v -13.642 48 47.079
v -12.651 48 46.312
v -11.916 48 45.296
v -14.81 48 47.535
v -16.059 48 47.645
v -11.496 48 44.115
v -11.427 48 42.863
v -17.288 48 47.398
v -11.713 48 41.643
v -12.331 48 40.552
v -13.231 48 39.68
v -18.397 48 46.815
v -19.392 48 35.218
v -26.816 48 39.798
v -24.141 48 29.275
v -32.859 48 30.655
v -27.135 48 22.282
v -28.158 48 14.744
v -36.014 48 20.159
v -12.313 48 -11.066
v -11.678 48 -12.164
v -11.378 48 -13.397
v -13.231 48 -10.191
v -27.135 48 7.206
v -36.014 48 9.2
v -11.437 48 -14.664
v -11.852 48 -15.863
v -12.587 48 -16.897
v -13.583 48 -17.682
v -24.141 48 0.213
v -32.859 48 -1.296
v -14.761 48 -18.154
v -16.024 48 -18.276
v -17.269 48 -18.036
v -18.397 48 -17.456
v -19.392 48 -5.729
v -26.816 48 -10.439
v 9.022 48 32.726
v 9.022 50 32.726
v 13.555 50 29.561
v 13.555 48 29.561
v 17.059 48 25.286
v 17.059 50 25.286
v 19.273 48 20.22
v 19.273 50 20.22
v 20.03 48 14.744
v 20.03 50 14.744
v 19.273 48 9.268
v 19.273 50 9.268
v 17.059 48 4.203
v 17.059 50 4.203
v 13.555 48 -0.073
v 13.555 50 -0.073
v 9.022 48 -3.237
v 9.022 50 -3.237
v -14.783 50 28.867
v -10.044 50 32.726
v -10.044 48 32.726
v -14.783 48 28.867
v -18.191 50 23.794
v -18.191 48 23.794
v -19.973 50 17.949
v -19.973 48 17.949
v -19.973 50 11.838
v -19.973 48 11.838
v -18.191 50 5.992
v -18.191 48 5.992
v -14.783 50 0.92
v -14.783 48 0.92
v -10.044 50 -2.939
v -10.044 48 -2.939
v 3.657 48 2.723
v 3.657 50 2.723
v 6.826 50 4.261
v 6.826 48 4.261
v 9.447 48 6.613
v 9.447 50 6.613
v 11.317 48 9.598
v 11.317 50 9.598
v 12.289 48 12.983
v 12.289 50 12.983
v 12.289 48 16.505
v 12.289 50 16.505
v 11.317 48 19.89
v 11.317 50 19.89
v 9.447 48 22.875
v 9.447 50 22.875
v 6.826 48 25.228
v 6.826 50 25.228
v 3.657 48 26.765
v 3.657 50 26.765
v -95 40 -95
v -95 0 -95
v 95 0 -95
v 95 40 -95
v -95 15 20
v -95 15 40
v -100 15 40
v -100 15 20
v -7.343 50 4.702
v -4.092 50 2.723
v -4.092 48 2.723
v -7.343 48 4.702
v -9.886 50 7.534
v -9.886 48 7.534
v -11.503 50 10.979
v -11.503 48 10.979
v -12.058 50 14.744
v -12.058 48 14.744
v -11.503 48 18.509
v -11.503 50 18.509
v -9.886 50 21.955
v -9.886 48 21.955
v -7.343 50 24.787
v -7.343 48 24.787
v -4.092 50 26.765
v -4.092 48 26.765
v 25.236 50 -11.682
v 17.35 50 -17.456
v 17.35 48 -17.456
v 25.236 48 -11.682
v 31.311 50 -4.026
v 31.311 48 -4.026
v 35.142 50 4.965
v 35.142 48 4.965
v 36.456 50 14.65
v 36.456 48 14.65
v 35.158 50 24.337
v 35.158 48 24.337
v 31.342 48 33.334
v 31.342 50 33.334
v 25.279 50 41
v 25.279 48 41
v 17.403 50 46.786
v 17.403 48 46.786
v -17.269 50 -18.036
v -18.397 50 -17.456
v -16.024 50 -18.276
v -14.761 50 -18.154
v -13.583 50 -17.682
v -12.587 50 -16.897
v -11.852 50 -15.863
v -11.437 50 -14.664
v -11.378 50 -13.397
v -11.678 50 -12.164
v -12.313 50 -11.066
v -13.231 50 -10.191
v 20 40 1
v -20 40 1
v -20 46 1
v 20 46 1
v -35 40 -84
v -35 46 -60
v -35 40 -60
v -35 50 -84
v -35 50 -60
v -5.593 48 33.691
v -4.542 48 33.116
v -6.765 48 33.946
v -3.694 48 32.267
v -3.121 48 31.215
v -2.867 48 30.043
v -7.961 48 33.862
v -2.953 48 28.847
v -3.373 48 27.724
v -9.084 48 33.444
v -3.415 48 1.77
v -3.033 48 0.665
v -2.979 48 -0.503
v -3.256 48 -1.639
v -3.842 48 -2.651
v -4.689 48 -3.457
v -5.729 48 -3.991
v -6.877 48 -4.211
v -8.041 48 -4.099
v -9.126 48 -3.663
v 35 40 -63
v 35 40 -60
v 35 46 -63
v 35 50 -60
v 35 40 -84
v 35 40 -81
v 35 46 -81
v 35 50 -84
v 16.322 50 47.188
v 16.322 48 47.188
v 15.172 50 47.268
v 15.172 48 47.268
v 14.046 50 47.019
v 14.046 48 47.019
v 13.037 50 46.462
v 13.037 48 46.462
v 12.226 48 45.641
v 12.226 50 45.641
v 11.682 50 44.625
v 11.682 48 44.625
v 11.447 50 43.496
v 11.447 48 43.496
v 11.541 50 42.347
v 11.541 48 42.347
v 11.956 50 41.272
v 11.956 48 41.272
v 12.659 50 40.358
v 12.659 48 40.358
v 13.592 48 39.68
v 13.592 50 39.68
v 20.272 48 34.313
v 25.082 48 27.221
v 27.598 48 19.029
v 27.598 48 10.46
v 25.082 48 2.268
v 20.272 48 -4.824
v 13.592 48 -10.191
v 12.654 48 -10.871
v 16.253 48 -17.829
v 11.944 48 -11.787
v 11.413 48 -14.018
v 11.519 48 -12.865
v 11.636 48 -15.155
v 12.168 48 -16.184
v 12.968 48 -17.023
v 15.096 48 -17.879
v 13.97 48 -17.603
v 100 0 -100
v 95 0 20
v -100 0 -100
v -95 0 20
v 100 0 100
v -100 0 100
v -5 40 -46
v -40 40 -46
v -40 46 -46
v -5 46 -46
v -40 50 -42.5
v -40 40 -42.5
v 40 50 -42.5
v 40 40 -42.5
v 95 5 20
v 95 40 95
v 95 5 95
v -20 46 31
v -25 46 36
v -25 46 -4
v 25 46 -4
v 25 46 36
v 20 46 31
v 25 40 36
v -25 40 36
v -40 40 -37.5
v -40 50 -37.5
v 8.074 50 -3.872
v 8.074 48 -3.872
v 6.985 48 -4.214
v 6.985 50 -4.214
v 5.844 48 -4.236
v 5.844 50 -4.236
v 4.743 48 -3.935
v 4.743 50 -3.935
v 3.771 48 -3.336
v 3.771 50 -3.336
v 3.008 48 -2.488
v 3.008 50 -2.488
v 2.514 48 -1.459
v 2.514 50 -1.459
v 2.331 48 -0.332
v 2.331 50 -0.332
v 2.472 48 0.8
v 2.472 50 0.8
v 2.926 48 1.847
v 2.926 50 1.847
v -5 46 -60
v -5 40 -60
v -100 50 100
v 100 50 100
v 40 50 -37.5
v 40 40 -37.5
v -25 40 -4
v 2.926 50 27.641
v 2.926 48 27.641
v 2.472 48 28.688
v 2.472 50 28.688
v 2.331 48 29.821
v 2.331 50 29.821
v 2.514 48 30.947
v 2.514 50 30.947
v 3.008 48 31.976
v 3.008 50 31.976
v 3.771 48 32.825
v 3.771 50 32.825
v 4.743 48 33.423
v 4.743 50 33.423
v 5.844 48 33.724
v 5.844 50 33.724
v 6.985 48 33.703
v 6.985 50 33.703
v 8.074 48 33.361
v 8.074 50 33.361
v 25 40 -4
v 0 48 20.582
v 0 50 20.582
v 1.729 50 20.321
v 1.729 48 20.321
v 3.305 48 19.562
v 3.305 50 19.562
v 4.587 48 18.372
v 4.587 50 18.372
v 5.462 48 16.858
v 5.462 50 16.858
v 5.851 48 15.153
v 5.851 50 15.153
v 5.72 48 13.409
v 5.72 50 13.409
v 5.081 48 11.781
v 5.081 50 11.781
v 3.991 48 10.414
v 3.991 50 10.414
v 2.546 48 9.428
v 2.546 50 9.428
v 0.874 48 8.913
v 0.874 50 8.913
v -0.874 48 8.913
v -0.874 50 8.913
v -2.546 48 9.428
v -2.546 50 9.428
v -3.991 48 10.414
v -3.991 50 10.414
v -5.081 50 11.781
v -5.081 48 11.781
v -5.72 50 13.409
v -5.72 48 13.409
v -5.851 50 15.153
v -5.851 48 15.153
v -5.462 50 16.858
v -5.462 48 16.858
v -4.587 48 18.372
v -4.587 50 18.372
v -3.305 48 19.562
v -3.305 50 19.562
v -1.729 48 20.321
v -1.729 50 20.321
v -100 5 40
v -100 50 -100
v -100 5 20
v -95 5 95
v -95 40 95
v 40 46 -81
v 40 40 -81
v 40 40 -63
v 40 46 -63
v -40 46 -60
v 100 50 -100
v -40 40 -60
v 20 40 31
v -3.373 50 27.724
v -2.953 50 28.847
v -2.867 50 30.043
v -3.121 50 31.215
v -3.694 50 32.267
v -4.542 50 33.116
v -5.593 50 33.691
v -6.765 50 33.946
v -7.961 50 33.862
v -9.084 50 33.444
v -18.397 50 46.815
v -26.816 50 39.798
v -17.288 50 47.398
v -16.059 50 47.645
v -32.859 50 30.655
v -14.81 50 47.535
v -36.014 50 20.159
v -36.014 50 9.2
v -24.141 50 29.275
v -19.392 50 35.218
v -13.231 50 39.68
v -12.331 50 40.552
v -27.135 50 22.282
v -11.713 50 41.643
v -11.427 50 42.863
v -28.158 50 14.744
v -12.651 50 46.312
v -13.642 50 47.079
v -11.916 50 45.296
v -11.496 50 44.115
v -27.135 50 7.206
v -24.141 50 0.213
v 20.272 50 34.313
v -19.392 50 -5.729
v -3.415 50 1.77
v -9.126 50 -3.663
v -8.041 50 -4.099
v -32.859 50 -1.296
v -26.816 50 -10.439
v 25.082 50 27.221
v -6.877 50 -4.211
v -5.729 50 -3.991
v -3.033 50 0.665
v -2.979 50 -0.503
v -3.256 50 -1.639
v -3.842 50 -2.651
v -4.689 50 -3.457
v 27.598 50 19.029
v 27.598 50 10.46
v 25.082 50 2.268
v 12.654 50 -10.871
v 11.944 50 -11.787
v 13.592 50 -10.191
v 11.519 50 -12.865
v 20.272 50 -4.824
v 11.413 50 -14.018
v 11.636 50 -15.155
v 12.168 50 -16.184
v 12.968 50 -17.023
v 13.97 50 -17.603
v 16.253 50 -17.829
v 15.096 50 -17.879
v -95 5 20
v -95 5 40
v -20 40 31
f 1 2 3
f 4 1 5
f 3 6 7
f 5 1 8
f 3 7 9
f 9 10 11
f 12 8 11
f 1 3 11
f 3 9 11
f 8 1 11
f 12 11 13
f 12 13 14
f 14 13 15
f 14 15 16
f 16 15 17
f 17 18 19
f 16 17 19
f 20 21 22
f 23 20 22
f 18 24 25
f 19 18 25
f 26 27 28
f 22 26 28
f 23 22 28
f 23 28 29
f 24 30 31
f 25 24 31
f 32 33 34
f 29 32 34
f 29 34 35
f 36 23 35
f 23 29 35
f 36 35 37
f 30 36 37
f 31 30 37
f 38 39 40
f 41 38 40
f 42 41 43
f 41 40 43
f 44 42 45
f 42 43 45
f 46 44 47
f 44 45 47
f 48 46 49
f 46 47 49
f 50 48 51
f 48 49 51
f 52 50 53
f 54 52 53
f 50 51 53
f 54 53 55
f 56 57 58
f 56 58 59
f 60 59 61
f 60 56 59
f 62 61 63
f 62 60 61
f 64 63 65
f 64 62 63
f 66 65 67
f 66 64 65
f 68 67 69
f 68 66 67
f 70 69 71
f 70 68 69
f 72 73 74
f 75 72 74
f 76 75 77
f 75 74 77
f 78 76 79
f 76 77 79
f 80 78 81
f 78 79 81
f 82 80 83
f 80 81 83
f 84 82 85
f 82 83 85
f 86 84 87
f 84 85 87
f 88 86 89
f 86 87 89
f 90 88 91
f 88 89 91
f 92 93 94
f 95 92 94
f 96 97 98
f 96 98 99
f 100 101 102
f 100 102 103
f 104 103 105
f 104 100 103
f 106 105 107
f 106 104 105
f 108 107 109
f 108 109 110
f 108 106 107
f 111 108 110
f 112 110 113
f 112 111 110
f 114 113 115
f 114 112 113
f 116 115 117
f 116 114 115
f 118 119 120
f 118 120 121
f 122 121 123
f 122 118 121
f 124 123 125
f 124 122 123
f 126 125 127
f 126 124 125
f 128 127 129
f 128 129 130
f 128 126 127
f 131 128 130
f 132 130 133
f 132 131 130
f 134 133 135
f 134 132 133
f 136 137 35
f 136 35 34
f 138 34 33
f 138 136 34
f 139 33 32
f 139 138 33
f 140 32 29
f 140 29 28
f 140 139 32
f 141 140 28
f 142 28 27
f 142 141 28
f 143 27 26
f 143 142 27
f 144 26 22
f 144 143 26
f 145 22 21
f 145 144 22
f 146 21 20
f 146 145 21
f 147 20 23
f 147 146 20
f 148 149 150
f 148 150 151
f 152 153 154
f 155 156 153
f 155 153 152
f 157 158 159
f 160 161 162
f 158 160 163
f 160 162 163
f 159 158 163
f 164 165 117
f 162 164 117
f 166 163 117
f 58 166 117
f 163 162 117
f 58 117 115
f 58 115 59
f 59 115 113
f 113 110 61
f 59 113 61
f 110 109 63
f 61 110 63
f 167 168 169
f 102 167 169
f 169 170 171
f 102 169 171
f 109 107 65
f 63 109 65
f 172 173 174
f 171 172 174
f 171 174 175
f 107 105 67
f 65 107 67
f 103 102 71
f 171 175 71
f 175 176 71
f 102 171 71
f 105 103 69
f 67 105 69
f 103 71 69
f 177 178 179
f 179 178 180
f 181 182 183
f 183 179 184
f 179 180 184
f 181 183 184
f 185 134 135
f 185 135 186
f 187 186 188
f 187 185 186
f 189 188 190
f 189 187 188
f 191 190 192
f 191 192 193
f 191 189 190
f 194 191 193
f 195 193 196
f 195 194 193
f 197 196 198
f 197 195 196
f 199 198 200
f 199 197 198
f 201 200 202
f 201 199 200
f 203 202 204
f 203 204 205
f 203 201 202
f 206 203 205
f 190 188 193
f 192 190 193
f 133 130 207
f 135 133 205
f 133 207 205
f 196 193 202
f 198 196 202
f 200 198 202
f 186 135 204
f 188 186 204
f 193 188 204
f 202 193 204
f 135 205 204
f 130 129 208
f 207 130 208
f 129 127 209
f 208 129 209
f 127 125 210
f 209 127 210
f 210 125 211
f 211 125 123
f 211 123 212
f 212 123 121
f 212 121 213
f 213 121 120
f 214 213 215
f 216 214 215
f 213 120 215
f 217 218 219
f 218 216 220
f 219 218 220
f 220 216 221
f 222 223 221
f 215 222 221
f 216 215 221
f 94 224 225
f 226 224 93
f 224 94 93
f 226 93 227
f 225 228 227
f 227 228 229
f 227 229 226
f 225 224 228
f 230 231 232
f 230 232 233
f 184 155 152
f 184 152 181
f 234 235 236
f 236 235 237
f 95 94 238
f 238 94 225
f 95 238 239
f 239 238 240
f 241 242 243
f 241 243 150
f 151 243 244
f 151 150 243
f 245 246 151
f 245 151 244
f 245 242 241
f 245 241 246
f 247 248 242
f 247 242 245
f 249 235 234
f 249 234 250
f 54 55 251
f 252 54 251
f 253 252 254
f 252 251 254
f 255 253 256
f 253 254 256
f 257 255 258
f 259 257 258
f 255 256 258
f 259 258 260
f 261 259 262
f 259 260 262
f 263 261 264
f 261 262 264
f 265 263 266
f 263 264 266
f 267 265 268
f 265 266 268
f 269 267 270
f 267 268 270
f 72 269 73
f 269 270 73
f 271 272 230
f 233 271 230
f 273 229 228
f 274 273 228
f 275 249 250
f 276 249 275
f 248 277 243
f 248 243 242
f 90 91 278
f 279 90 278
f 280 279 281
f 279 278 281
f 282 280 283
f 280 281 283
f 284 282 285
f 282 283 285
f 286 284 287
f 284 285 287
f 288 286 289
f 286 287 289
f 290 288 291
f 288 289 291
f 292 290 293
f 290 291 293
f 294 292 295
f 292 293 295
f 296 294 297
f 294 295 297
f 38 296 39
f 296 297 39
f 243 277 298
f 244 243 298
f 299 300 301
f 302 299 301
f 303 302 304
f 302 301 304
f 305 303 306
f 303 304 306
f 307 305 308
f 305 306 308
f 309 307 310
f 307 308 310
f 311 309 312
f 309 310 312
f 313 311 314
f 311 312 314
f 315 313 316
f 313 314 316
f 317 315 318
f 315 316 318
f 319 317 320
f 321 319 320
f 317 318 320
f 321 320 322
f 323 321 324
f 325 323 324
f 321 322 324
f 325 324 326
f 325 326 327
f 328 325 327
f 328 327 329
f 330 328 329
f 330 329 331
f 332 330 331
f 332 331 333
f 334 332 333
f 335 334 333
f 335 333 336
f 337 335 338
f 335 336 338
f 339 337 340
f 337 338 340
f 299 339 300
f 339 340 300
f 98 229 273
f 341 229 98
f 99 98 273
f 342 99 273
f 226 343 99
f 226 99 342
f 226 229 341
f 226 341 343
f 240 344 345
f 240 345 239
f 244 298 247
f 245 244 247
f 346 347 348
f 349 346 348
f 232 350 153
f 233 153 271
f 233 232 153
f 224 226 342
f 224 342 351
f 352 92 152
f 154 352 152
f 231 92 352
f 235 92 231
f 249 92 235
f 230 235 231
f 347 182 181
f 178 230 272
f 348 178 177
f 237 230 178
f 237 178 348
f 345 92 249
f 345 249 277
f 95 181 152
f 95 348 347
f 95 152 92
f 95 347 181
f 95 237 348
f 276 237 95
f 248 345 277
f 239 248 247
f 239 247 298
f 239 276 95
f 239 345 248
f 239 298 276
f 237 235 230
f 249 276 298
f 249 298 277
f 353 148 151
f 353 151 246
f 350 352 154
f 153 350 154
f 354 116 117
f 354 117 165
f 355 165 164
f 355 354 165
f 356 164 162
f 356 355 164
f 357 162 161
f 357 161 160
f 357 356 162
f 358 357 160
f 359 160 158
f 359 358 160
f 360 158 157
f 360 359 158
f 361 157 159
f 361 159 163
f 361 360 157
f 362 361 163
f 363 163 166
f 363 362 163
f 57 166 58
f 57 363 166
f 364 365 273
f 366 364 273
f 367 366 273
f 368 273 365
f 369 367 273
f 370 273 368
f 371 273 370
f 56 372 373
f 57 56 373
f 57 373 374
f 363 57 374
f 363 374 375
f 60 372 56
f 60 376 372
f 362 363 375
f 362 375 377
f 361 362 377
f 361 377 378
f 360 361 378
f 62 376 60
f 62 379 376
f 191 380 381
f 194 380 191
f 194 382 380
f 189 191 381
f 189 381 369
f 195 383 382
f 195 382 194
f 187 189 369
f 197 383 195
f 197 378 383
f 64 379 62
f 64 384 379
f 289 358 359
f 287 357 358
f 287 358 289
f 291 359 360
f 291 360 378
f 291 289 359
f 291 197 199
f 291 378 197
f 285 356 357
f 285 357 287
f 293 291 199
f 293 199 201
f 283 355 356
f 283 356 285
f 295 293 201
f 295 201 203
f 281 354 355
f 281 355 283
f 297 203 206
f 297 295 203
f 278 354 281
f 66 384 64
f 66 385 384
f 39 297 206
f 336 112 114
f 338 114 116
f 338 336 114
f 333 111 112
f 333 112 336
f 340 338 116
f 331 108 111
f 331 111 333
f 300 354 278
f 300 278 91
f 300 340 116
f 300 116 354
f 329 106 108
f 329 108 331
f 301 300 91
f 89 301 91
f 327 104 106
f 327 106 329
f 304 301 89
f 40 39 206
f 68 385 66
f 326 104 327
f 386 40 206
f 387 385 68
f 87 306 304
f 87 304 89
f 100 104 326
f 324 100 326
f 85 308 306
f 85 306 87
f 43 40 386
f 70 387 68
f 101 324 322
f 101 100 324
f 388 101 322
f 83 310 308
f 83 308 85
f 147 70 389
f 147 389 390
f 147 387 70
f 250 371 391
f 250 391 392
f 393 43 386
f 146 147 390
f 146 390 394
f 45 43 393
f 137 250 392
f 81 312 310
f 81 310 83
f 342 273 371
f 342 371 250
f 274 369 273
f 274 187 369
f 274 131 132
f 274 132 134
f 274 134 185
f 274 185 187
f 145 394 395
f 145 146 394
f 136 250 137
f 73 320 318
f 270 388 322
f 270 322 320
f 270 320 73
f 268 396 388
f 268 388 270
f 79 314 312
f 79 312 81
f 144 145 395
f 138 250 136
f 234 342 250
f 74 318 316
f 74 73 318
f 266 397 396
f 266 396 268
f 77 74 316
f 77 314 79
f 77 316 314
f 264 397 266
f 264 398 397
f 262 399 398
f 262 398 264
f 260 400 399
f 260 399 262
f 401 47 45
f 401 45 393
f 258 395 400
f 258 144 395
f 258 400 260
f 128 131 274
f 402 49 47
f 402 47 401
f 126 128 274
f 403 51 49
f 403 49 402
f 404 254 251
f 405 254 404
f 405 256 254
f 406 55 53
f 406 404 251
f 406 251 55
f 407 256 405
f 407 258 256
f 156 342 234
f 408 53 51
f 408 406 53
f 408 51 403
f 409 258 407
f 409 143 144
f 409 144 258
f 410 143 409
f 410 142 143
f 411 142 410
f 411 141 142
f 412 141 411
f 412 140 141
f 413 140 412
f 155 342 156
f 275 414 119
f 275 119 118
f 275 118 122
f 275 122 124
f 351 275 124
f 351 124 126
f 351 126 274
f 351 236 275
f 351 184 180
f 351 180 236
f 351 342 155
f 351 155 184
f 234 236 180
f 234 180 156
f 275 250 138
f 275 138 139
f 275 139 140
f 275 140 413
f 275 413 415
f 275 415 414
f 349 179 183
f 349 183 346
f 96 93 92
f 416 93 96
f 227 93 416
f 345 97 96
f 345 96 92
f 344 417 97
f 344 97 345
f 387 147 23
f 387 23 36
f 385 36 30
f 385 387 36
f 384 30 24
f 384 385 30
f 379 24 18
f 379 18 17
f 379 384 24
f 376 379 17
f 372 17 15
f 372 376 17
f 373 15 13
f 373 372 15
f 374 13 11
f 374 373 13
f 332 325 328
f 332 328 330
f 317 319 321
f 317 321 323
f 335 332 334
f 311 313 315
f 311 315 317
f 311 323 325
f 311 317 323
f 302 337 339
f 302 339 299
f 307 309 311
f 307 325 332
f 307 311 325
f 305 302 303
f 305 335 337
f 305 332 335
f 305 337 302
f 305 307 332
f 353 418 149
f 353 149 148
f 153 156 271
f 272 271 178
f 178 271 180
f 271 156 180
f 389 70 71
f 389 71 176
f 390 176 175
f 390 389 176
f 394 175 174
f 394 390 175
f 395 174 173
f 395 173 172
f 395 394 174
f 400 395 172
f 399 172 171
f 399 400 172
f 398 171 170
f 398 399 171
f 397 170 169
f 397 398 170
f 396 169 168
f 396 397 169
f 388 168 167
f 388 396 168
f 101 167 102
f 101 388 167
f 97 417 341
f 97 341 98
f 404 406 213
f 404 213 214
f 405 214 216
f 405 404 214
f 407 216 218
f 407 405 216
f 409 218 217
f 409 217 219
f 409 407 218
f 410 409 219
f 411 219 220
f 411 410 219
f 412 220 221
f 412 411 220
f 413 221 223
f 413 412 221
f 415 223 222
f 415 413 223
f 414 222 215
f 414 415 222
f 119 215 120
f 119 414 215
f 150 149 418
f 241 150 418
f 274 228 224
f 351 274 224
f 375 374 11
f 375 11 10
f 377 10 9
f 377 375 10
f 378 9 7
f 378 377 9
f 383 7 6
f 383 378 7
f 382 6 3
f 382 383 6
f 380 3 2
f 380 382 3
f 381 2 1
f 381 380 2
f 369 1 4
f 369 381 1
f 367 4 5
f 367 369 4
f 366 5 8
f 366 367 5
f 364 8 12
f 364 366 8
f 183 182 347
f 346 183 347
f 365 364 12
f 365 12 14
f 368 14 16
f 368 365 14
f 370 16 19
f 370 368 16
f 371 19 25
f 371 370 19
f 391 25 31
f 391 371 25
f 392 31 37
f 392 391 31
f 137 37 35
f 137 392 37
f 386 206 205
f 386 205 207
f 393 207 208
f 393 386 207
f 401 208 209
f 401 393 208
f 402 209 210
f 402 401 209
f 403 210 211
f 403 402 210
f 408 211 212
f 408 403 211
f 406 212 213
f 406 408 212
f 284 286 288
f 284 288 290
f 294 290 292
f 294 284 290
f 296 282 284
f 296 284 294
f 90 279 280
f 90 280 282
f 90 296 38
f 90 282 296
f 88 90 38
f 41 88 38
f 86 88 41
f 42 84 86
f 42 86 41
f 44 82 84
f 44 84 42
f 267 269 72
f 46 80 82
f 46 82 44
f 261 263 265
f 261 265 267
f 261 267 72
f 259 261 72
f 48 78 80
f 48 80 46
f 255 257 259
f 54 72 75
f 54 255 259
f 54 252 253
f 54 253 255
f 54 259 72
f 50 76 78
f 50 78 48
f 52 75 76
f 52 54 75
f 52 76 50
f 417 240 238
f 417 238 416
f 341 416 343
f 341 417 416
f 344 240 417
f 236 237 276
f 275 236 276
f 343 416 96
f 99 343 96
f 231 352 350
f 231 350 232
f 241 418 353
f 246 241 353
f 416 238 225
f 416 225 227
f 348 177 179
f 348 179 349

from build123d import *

# Parameters (mm, degrees)
ESQUISSE1_W              = 200
ESQUISSE1_H              = 200
BOSS_EXTRU_1_DEPTH       = 50
ESQUISSE2_W              = 190
ESQUISSE2_H              = 190
ENL_V_MAT_EXTRU_1_DEPTH  = 40
ESQUISSE3_W              = 70
ESQUISSE3_H              = 24
ENL_V_MAT_EXTRU_2_DEPTH  = 10
ESQUISSE5_W              = 5
ESQUISSE5_H              = 18
ESQUISSE5_W_2            = 30
ESQUISSE5_H_2            = 14
ENL_V_MAT_EXTRU_3_DEPTH  = 6
ESQUISSE7_W              = 5
ESQUISSE7_H              = 14
ENL_V_MAT_EXTRU_5_DEPTH  = 6
ESQUISSE8_W              = 80
ESQUISSE8_H              = 5
ENL_V_MAT_EXTRU_6_DEPTH  = 10
ESQUISSE9_W              = 190
ESQUISSE9_H              = 5
BOSS_EXTRU_2_DEPTH       = 75
ESQUISSE11_W             = 50
ESQUISSE11_H             = 40
ESQUISSE11_W_2           = 40
ESQUISSE11_H_2           = 30
ENL_V_MAT_EXTRU_9_DEPTH  = 6
ESQUISSE12_R             = 5.86708194
ENL_V_MAT_EXTRU_10_DEPTH = 2
ESQUISSE13_W             = 20
ESQUISSE13_H             = 10
ENL_V_MAT_EXTRU_11_DEPTH = 5


with BuildPart() as part:
    # Esquisse1 → Boss.-Extru.1 (new body)
    with BuildSketch(Plane(origin=(0, 0, 0), x_dir=(1, 0, 0), z_dir=(0, 1, 0))):
        Rectangle(ESQUISSE1_W, ESQUISSE1_H)
    extrude(amount=BOSS_EXTRU_1_DEPTH)

    # Esquisse2 → Enlèv. mat.-Extru.1 (cut)
    with BuildSketch(Plane.XZ):
        Rectangle(ESQUISSE2_W, ESQUISSE2_H)
    extrude(amount=-ENL_V_MAT_EXTRU_1_DEPTH, mode=Mode.SUBTRACT)

    # Esquisse3 → Enlèv. mat.-Extru.2 (cut)
    with BuildSketch(Plane(origin=(0, 50, 0), x_dir=(1, 0, 0), z_dir=(0, 1, 0))):
        with Locations((0, 72)):
            Rectangle(ESQUISSE3_W, ESQUISSE3_H)
    extrude(amount=-ENL_V_MAT_EXTRU_2_DEPTH, mode=Mode.SUBTRACT)

    # Esquisse5 → Enlèv. mat.-Extru.3 (cut)
    with BuildSketch(Plane.XZ.offset(-40)):
        with Locations((37.5, -72)):
            Rectangle(ESQUISSE5_W, ESQUISSE5_H)
        with Locations((-20, -53)):
            Rectangle(ESQUISSE5_W_2, ESQUISSE5_H_2)
    extrude(amount=-ENL_V_MAT_EXTRU_3_DEPTH, mode=Mode.SUBTRACT)

    # Esquisse7 → Enlèv. mat.-Extru.5 (cut)
    with BuildSketch(Plane.XZ.offset(-40)):
        with Locations((-37.5, -53)):
            Rectangle(ESQUISSE7_W, ESQUISSE7_H)
    extrude(amount=-ENL_V_MAT_EXTRU_5_DEPTH, mode=Mode.SUBTRACT)

    # Esquisse8 → Enlèv. mat.-Extru.6 (cut)
    with BuildSketch(Plane.XZ.offset(-40)):
        with Locations((0, -40)):
            Rectangle(ESQUISSE8_W, ESQUISSE8_H)
    extrude(amount=-ENL_V_MAT_EXTRU_6_DEPTH, mode=Mode.SUBTRACT)

    # Esquisse9 → Boss.-Extru.2 (add)
    with BuildSketch(Plane(origin=(0, 0, 95), x_dir=(-1, 0, 0), z_dir=(0, 0, -1))):
        with Locations((0, 2.5)):
            Rectangle(ESQUISSE9_W, ESQUISSE9_H)
    extrude(amount=BOSS_EXTRU_2_DEPTH)

    # Esquisse11 → Enlèv. mat.-Extru.9 (cut)
    with BuildSketch(Plane.XZ.offset(-40)):
        with Locations((0, 16)):
            Rectangle(ESQUISSE11_W, ESQUISSE11_H)
        with Locations((0, 16)):
            Rectangle(ESQUISSE11_W_2, ESQUISSE11_H_2, mode=Mode.SUBTRACT)
    extrude(amount=-ENL_V_MAT_EXTRU_9_DEPTH, mode=Mode.SUBTRACT)

    # Esquisse12 → Enlèv. mat.-Extru.10 (cut)
    with BuildSketch(Plane(origin=(0, 50, 0), x_dir=(1, 0, 0), z_dir=(0, 1, 0))):
        with Locations(Location((0, -14.714419725, 0), (0, 0, 270))):
            Circle(ESQUISSE12_R)
        with BuildLine():
            ThreePointArc((3.657276348, -2.723473664), (12.412554836, -14.744243454), (3.657276348, -26.765013245))
            ThreePointArc((3.657276348, -26.765013245), (3.359240733, -32.427689923), (9.021917411, -32.725725538))
            ThreePointArc((9.021917411, -32.725725538), (20.02990103, -14.744243454), (9.021917411, 3.237238629))
            ThreePointArc((9.021917411, 3.237238629), (3.359240733, 2.939203014), (3.657276348, -2.723473664))
        make_face()
        with BuildLine():
            ThreePointArc((-4.091649632, -2.723473664), (-12.057804345, -14.744243454), (-4.091649632, -26.765013245))
            ThreePointArc((-4.091649632, -26.765013245), (-4.087653986, -32.721729891), (-10.044370632, -32.725725538))
            ThreePointArc((-10.044370632, -32.725725538), (-20.198964068, -14.893261262), (-10.044370632, 2.939203014))
            ThreePointArc((-10.044370632, 2.939203014), (-4.236671793, 3.084225175), (-4.091649632, -2.723473664))
        make_face()
        with BuildLine():
            ThreePointArc((13.591796836, 10.19140297), (11.86542759, 15.688813034), (17.349999414, 17.455544504))
            ThreePointArc((17.349999414, 17.455544504), (36.455816795, -14.649786555), (17.402535548, -46.786323611))
            ThreePointArc((17.402535548, -46.786323611), (11.917488852, -45.152665208), (13.591796836, -39.679889879))
            ThreePointArc((13.591796836, -39.679889879), (27.918200585, -14.744243454), (13.591796836, 10.19140297))
        make_face()
        with BuildLine():
            ThreePointArc((-13.231408481, -39.679889879), (-12.247030277, -45.830218737), (-18.397359135, -46.814596942))
            ThreePointArc((-18.397359135, -46.814596942), (-36.414367356, -14.679352885), (-18.397359135, 17.455891172))
            ThreePointArc((-18.397359135, 17.455891172), (-12.182139707, 16.406622398), (-13.231408481, 10.19140297))
            ThreePointArc((-13.231408481, 10.19140297), (-28.157745811, -14.744243454), (-13.231408481, -39.679889879))
        make_face()
    extrude(amount=-ENL_V_MAT_EXTRU_10_DEPTH, mode=Mode.SUBTRACT)

    # Esquisse13 → Enlèv. mat.-Extru.11 (cut)
    with BuildSketch(Plane(origin=(-95, 0, 0), x_dir=(0, 0, -1), z_dir=(1, 0, 0))):
        with Locations((-30, 10)):
            Rectangle(ESQUISSE13_W, ESQUISSE13_H)
    extrude(amount=-ENL_V_MAT_EXTRU_11_DEPTH, mode=Mode.SUBTRACT)


solid = part.part
